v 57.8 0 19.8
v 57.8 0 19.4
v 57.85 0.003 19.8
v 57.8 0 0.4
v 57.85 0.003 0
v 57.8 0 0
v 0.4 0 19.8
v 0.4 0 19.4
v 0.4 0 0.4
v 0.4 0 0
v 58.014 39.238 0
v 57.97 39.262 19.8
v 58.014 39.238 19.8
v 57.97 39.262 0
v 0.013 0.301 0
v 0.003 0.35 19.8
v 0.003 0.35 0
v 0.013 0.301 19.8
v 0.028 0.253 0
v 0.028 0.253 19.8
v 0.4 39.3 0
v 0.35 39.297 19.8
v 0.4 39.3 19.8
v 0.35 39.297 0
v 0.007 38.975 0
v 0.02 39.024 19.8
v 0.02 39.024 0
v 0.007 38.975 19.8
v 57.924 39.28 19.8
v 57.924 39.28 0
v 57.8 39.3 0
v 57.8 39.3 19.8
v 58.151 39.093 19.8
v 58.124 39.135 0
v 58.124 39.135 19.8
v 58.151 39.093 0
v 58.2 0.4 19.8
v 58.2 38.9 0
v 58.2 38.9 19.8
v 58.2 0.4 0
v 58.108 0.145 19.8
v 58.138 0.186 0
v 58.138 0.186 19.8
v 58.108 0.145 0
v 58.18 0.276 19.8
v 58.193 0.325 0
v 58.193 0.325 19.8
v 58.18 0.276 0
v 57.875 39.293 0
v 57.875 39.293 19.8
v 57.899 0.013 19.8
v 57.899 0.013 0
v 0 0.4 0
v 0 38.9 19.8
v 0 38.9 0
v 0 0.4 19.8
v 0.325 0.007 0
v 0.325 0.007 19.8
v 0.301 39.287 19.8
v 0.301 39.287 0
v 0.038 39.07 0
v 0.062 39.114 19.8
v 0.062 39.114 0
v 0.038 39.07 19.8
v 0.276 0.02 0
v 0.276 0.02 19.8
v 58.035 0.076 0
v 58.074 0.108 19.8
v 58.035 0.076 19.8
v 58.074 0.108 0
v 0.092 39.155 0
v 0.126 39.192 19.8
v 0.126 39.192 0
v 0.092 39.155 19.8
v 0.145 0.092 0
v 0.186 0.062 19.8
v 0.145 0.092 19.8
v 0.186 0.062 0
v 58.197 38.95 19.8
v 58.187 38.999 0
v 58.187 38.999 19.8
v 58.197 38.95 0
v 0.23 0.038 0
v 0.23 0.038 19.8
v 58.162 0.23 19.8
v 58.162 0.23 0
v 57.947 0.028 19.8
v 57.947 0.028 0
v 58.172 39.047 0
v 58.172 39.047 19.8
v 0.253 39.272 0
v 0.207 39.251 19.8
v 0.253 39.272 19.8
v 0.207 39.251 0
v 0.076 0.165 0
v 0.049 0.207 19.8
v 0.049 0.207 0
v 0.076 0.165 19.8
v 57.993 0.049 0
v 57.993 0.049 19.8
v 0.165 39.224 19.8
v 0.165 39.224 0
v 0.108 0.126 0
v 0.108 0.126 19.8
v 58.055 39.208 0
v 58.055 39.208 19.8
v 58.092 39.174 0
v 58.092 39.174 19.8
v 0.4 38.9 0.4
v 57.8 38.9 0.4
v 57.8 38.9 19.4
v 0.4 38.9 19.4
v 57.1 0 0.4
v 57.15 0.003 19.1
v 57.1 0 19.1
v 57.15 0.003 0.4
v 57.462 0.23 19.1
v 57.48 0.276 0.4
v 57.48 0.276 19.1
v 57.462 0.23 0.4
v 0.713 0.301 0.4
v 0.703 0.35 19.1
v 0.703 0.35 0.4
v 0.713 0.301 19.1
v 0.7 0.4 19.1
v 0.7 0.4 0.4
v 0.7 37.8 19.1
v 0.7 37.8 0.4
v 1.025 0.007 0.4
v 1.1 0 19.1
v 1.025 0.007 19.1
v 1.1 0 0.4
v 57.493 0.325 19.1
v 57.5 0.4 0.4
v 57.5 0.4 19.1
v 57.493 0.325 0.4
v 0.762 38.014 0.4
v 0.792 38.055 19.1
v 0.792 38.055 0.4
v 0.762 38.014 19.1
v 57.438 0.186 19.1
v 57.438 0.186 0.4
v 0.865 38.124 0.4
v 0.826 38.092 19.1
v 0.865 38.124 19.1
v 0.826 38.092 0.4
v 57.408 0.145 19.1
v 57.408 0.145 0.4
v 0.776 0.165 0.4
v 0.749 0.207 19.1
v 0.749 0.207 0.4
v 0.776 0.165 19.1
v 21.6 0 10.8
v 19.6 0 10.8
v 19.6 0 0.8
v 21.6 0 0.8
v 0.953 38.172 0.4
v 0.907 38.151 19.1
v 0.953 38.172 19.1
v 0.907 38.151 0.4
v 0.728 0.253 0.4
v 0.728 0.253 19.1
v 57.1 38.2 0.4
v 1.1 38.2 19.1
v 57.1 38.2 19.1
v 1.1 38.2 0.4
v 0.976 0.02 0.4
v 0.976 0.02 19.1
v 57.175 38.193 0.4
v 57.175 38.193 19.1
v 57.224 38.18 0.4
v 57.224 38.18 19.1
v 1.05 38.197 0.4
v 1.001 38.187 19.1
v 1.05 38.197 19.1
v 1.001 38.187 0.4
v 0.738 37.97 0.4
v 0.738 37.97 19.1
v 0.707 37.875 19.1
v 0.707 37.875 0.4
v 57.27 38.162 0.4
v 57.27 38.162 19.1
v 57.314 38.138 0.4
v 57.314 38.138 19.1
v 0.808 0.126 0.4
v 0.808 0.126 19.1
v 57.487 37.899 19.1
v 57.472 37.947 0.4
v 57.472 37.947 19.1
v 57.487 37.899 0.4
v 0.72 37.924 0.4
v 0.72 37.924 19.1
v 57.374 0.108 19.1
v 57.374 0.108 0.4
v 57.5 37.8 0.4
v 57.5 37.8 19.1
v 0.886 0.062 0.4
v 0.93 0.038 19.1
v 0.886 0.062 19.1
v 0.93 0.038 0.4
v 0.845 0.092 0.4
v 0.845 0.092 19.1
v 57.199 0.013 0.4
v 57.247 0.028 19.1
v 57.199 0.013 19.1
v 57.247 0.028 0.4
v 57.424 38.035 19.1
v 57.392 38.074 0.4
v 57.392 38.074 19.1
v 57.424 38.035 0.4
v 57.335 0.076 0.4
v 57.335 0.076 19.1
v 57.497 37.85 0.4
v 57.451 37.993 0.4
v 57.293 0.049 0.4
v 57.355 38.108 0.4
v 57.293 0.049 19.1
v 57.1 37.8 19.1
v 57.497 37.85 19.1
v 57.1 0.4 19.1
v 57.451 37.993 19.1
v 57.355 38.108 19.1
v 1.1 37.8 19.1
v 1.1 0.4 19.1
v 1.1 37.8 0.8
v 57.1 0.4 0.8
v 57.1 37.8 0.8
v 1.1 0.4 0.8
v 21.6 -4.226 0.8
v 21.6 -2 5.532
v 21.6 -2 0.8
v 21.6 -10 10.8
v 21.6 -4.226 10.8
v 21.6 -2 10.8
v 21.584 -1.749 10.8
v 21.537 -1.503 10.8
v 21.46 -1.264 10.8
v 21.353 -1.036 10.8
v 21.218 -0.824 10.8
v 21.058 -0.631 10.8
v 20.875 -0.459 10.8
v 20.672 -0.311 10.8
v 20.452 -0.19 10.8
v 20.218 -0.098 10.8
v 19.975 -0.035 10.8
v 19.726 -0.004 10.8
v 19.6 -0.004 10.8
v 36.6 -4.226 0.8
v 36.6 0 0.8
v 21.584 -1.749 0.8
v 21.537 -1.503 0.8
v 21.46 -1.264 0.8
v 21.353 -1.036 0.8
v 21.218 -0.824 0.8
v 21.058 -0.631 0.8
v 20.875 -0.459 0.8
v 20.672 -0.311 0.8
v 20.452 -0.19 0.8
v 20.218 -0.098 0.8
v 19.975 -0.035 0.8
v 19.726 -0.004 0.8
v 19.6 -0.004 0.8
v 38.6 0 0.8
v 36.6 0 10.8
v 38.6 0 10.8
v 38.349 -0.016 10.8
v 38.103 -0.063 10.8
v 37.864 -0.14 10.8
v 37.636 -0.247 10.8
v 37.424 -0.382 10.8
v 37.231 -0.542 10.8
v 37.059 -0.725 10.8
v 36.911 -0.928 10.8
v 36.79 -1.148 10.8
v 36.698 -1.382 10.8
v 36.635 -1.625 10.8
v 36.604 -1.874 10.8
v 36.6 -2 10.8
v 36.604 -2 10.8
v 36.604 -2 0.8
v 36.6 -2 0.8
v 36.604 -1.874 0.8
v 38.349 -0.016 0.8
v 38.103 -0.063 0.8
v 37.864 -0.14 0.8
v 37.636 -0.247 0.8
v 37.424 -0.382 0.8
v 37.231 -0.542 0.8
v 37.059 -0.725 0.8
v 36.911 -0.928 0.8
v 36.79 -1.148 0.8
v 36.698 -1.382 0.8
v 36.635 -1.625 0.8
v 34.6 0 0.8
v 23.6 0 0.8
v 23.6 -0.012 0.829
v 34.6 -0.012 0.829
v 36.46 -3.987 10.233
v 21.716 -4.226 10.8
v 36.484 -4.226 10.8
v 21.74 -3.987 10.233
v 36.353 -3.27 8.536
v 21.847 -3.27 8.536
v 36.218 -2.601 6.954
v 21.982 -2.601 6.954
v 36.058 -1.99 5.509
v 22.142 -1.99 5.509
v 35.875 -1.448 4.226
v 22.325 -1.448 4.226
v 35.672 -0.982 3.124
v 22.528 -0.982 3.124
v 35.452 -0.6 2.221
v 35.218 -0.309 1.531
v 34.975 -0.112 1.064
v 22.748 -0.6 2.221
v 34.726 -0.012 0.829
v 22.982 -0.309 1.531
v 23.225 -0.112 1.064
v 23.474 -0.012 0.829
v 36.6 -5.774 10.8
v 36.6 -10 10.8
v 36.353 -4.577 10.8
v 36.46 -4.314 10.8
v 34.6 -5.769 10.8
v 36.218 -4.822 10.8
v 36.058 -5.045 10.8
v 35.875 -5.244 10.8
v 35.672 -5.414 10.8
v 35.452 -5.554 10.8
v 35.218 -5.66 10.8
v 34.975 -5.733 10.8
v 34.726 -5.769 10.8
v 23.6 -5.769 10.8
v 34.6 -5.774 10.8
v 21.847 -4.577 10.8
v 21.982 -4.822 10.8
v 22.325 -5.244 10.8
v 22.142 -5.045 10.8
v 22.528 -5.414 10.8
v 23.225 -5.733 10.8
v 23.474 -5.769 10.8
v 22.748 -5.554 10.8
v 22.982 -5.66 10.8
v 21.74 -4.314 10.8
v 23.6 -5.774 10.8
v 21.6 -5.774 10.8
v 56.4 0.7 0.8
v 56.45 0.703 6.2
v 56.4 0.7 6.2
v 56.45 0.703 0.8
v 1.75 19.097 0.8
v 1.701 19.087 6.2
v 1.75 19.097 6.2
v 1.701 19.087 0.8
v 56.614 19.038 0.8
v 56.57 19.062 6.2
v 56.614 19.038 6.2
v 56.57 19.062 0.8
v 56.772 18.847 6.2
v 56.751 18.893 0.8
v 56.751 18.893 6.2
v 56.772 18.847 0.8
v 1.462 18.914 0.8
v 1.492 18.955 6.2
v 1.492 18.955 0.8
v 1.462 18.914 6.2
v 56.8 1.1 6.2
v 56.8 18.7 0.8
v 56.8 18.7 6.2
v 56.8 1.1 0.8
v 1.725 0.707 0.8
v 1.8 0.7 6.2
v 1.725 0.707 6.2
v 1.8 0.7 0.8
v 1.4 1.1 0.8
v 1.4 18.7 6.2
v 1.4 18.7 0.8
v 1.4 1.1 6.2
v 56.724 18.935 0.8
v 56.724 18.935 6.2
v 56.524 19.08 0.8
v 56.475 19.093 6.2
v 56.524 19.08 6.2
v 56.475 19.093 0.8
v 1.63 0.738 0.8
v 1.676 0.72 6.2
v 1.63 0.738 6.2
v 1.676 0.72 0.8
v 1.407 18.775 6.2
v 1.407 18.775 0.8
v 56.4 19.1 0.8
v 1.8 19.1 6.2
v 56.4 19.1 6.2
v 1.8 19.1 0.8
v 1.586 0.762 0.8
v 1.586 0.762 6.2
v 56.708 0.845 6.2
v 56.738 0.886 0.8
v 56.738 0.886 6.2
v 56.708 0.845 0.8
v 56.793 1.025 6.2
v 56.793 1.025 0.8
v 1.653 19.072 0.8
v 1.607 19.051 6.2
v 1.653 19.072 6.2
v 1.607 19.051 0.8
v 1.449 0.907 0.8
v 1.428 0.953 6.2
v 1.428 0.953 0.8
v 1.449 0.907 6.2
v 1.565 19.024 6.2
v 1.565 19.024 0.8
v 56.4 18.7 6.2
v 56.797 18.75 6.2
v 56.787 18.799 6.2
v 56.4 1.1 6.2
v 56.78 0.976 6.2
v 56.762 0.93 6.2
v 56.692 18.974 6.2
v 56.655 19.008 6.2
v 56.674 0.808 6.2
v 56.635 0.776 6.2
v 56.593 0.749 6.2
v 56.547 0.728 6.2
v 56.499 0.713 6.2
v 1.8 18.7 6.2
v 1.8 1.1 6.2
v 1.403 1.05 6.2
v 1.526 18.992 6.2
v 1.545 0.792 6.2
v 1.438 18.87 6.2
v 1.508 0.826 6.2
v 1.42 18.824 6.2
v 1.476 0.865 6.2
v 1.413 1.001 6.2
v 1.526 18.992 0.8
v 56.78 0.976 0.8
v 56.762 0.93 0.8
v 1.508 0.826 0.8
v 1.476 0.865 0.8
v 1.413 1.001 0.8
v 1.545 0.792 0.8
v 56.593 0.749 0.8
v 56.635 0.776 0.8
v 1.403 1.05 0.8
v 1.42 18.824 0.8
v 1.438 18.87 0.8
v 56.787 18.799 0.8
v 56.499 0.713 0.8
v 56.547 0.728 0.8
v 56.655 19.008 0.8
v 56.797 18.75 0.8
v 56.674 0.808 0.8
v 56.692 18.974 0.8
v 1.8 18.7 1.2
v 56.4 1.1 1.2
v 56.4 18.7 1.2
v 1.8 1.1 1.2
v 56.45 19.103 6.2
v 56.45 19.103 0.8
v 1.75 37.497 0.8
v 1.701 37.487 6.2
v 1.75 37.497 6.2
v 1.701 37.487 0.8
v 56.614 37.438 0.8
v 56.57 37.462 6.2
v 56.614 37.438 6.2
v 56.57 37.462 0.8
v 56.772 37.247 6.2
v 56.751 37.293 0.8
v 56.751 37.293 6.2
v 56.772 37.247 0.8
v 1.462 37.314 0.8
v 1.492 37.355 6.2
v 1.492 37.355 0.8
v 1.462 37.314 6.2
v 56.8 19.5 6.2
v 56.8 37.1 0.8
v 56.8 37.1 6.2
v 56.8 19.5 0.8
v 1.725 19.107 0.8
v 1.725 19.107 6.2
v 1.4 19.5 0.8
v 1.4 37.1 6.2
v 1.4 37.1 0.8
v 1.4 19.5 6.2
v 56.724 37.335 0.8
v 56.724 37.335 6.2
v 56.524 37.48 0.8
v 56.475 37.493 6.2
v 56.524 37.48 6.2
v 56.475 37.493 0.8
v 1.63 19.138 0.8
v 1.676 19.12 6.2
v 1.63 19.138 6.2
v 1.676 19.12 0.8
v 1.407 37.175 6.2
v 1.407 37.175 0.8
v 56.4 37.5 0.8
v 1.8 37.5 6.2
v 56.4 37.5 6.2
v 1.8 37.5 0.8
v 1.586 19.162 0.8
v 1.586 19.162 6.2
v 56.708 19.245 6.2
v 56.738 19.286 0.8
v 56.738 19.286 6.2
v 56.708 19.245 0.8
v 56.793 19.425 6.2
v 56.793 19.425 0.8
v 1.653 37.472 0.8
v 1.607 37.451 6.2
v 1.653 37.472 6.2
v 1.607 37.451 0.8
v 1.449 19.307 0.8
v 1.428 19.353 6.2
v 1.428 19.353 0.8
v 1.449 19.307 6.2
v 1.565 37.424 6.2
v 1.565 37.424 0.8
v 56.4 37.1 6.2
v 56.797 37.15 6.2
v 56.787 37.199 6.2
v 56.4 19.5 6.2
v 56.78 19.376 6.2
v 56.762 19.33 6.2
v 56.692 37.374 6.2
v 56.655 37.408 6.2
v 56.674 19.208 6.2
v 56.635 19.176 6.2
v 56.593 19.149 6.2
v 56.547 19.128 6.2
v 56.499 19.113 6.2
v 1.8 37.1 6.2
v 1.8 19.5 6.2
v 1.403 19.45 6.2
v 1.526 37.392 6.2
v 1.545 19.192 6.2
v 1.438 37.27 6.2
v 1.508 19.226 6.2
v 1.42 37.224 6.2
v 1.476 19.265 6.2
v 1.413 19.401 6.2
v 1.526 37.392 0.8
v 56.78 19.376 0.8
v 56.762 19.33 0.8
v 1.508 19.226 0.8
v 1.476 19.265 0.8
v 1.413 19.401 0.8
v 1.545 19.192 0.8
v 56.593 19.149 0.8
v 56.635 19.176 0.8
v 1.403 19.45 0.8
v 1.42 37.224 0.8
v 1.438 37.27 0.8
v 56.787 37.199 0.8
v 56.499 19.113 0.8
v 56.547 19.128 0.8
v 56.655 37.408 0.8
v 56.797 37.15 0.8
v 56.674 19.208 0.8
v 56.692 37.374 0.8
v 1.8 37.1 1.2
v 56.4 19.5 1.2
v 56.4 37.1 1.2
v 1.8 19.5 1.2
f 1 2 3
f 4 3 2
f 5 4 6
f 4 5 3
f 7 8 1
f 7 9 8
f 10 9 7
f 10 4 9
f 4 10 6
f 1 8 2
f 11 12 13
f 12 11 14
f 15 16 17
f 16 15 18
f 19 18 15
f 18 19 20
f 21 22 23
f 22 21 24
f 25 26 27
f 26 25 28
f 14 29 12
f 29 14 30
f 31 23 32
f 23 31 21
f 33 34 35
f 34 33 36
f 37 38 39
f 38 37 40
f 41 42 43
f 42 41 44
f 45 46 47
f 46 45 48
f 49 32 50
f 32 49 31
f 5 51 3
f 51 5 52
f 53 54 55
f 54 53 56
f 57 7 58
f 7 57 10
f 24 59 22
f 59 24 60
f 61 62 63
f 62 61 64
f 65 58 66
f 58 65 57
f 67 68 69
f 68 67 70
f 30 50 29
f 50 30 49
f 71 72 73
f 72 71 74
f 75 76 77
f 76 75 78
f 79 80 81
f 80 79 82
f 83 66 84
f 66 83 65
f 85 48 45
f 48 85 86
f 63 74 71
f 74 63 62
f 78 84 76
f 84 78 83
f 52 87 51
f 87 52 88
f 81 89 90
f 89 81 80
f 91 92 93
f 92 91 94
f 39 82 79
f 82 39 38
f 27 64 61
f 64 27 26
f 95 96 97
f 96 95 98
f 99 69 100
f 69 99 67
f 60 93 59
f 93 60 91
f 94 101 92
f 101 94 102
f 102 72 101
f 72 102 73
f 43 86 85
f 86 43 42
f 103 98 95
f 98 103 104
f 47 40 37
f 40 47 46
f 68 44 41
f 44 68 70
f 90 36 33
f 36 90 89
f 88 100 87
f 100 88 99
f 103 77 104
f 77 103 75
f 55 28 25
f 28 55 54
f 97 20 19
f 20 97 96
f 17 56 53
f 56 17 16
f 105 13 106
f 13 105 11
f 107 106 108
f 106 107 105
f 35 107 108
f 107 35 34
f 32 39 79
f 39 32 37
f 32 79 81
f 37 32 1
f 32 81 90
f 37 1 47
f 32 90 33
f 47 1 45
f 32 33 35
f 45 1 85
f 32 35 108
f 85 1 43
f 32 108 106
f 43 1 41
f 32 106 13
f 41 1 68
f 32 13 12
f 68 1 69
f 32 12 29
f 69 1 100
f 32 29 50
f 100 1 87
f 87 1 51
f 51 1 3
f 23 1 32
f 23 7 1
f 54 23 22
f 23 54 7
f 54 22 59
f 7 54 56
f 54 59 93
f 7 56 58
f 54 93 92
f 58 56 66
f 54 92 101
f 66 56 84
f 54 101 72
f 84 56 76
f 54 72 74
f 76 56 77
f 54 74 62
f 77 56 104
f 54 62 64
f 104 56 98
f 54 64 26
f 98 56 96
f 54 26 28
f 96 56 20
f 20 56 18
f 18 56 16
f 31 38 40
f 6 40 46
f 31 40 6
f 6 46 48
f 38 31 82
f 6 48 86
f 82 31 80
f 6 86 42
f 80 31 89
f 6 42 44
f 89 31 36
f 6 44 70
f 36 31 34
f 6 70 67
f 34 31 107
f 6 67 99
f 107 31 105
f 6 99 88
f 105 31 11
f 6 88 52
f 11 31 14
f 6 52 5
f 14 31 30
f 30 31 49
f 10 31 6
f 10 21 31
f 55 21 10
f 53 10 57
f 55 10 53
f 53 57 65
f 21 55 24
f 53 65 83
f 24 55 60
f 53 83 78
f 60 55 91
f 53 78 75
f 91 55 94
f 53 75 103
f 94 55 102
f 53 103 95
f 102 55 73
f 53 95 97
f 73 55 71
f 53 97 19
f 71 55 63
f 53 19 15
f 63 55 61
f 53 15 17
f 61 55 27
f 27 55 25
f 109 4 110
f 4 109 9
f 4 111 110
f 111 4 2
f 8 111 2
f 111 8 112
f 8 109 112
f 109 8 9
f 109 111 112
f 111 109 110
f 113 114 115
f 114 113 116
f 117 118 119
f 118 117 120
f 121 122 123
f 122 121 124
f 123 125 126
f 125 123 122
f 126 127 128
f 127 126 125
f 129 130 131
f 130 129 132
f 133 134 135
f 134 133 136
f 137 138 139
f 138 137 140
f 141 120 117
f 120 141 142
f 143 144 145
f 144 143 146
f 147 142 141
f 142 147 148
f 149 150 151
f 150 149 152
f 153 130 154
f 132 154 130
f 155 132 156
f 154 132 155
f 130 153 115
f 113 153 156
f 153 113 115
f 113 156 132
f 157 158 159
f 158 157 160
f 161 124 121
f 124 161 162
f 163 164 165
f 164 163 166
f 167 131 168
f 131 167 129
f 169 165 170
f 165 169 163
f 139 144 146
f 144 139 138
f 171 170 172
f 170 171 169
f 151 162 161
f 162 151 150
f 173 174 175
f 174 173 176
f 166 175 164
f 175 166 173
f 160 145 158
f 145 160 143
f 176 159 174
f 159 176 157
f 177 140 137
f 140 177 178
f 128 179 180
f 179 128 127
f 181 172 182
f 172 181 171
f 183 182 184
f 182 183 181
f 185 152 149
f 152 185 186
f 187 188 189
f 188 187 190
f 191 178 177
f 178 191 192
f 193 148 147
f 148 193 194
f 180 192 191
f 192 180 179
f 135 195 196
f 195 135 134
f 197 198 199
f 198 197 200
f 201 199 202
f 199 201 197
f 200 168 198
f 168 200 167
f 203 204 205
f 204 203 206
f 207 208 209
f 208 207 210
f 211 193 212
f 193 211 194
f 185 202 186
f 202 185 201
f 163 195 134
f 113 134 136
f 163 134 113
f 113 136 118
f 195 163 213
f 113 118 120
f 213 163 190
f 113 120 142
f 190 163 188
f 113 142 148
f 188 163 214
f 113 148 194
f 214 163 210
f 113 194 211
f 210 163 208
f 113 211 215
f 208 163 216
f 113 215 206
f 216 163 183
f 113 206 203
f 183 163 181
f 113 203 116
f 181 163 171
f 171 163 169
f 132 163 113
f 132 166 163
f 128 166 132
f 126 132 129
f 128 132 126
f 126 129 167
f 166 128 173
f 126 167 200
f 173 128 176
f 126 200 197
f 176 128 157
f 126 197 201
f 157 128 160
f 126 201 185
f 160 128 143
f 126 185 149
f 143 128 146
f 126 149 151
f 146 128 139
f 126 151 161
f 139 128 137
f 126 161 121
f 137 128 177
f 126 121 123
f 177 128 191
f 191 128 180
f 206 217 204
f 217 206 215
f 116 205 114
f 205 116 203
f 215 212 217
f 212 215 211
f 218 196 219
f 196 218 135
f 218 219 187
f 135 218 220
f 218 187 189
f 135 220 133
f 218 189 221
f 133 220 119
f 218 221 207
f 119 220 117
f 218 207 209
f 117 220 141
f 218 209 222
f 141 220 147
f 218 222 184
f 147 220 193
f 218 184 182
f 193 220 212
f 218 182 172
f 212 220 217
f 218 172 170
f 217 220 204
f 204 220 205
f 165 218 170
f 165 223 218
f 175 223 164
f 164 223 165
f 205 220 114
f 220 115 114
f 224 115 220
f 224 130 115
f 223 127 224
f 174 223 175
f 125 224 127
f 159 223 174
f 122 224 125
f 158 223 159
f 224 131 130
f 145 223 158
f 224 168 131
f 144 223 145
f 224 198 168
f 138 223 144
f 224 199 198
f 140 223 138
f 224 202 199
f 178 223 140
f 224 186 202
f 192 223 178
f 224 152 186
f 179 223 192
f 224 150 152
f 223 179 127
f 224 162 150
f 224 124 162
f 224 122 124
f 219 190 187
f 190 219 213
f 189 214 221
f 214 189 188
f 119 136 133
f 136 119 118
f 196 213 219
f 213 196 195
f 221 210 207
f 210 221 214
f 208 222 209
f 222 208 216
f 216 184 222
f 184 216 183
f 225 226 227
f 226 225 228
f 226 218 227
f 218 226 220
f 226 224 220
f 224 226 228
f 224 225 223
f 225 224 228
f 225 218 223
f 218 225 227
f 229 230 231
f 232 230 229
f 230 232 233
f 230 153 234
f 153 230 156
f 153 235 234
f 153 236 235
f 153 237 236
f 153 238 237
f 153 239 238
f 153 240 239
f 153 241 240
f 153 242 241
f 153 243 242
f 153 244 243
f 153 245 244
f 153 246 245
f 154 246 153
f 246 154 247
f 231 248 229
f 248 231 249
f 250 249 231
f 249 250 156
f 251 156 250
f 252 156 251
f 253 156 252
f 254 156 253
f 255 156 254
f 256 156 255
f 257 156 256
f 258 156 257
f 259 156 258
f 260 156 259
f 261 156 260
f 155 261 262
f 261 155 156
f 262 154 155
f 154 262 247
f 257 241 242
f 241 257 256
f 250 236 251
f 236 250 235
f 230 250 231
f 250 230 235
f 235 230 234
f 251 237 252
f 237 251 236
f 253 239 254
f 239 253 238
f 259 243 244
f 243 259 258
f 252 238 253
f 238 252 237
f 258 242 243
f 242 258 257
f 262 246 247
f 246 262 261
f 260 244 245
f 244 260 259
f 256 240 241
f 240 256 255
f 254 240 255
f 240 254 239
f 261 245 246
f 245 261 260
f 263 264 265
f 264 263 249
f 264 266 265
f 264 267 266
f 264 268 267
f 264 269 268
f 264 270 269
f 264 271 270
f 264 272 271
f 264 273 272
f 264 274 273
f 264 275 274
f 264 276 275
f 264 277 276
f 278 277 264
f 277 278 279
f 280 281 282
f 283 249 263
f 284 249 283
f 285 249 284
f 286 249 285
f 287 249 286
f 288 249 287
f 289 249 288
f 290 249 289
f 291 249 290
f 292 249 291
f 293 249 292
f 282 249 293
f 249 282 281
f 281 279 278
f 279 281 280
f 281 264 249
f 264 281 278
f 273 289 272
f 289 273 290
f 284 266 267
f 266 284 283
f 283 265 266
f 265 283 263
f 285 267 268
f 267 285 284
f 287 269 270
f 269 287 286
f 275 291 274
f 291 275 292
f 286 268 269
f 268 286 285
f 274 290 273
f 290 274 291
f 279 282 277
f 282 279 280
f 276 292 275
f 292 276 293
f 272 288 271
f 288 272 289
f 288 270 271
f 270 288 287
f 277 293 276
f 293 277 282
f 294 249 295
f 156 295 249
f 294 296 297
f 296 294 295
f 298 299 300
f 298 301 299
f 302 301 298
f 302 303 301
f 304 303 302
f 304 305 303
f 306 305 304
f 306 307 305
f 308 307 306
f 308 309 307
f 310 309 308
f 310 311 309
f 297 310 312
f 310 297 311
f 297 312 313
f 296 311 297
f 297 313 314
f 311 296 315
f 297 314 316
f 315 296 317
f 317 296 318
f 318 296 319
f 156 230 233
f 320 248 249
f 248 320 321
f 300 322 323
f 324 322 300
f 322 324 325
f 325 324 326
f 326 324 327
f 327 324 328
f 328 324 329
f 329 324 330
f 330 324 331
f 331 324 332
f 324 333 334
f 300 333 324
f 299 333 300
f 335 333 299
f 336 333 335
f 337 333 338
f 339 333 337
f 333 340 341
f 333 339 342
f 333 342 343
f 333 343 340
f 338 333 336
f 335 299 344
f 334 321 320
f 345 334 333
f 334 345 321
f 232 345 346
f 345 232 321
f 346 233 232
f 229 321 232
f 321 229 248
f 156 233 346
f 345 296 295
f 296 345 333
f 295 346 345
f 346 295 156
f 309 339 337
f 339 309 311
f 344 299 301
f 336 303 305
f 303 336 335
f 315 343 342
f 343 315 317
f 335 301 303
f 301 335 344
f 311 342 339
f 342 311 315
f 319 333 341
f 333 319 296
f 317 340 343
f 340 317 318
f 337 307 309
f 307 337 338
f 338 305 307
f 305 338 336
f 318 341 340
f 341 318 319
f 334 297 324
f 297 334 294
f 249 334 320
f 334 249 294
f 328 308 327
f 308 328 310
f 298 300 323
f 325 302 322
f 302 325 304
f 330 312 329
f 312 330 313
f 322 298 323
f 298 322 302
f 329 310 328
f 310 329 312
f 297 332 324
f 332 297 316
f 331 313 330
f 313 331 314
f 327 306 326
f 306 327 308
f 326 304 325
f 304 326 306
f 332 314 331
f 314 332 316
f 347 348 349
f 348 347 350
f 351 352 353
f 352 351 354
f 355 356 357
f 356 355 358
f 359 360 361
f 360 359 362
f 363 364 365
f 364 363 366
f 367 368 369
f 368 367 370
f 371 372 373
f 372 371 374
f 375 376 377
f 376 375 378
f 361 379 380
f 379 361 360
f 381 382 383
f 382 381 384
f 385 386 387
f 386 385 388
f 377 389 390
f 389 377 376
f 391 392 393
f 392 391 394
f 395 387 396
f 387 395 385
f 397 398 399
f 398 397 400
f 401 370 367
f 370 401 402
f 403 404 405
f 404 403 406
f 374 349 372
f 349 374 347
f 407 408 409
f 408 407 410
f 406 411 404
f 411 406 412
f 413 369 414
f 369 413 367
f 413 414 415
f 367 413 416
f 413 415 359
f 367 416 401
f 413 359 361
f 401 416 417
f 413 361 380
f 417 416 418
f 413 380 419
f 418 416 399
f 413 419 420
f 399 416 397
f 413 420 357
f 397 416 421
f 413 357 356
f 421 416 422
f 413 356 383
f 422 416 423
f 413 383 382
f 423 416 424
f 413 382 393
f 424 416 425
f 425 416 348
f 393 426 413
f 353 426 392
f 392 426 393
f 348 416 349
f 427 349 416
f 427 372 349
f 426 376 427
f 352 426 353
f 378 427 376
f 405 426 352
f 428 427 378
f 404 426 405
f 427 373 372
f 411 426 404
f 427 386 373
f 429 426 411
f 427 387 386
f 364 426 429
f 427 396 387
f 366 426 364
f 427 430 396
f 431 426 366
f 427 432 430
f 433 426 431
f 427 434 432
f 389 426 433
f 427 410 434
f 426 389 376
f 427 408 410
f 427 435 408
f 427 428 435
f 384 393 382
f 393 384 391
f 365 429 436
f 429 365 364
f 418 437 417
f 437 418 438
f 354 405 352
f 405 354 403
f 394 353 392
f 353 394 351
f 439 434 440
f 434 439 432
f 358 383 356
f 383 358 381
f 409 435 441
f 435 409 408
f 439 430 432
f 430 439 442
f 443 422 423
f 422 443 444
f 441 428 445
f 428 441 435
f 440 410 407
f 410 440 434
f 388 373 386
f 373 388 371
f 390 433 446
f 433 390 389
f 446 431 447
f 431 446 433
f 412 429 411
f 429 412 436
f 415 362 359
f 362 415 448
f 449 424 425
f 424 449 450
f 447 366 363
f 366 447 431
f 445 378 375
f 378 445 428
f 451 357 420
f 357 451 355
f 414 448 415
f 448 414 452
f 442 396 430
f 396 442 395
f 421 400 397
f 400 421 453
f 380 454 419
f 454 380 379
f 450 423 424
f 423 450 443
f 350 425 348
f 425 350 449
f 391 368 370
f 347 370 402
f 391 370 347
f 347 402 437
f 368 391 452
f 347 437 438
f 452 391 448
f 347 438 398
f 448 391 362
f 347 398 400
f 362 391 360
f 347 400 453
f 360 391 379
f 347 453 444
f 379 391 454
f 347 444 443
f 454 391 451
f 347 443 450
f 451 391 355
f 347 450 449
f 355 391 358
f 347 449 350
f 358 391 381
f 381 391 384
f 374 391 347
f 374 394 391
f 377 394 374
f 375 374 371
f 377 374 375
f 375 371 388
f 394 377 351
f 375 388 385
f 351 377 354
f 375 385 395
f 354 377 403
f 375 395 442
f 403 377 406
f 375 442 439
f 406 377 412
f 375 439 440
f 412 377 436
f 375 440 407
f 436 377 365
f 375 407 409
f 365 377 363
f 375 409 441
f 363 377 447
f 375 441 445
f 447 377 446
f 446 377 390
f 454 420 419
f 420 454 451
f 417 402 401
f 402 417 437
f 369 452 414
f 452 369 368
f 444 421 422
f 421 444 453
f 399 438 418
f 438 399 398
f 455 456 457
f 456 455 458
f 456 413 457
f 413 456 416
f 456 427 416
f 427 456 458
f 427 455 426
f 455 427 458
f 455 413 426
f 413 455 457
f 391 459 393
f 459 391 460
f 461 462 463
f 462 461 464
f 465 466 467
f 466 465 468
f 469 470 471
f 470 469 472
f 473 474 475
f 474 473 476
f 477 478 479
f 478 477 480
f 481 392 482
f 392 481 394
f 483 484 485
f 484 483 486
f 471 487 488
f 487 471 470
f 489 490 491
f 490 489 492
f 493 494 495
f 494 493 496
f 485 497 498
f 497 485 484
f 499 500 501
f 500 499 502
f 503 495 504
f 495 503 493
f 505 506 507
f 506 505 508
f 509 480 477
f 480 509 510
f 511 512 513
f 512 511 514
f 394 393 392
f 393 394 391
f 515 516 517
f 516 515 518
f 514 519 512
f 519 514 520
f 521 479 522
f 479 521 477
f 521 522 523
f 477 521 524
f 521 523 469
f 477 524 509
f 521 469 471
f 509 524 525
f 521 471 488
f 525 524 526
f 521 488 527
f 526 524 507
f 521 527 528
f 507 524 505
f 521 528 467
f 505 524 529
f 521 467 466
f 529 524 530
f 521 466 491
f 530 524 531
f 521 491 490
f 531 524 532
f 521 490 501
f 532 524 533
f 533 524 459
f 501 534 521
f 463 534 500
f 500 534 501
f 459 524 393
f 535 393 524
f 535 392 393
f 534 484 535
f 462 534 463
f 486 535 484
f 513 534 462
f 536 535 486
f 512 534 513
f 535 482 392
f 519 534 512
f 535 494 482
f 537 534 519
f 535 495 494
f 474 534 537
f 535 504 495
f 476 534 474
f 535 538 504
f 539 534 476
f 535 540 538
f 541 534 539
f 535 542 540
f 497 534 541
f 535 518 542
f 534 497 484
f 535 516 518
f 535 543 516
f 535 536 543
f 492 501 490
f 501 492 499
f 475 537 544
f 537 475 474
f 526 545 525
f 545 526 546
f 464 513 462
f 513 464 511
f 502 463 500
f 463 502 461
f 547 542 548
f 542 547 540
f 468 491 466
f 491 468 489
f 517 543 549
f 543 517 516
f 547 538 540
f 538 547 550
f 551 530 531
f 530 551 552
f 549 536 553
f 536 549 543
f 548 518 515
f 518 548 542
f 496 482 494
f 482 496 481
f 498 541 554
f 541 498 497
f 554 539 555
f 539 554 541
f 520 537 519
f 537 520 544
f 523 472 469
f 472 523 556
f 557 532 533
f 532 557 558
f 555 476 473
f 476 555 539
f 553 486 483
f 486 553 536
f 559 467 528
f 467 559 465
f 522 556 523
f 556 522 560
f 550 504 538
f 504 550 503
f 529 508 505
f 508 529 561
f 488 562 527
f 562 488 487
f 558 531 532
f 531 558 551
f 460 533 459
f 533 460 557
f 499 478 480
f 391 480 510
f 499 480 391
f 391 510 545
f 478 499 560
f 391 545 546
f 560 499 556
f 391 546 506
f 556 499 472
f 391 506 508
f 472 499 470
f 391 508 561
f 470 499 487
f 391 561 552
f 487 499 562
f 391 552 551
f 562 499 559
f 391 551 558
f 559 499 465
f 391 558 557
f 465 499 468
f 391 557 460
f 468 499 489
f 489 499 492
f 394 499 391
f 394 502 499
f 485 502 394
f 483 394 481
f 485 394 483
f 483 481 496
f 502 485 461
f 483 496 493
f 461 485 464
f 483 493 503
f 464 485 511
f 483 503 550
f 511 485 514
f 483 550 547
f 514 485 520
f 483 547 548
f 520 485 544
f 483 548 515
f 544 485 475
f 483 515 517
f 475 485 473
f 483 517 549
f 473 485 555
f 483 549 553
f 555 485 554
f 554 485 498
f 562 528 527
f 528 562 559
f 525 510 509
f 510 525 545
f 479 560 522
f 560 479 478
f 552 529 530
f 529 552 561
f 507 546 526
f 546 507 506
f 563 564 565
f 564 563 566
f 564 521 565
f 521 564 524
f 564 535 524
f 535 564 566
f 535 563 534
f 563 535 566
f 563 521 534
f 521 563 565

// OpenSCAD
/* [Key Profile] */

fancy_render = true;
$fn = fancy_render ? 50 : 10;

// Select the key spacing standard used to size each tray footprint.
key_profile = "choc"; // [mx, choc]

/* [3D Printing] */

// 3D printing settings and validation.
spiral_vase = true; // [true, false]
nozzle_width_mm = 0.4; // [0.2:0.05:1.0]

/* [Key Spacing] */

// Standard key spacing dimensions.
mx_key_spacing_mm = 19.05; // [18:0.05:20]
choc_key_spacing_x_mm = 18; // [16:0.05:20]
choc_key_spacing_y_mm = 17; // [16:0.05:20]

// Shared wall, floor, and fit dimensions.
wall_thickness_mm = 0.4; // [0.2:0.05:2.0]
floor_thickness_mm = 0.4; // [0.2:0.05:2.0]
default_clearance_mm = 0.3; // [0:0.05:1.0]

// Effective print dimensions. Spiral vase mode forces single-line walls and floor.
effective_wall_thickness_mm = spiral_vase ? nozzle_width_mm : wall_thickness_mm;
effective_floor_thickness_mm = spiral_vase ? nozzle_width_mm : floor_thickness_mm;

assert(nozzle_width_mm > 0, "nozzle_width_mm must be greater than 0");
assert(wall_thickness_mm > 0, "wall_thickness_mm must be greater than 0");
assert(floor_thickness_mm > 0, "floor_thickness_mm must be greater than 0");
assert(default_clearance_mm >= 0, "default_clearance_mm must be non-negative");
assert(
  !spiral_vase || wall_thickness_mm == nozzle_width_mm,
  "spiral_vase requires wall_thickness_mm to match nozzle_width_mm"
);
assert(
  !spiral_vase || floor_thickness_mm == nozzle_width_mm,
  "spiral_vase requires floor_thickness_mm to match nozzle_width_mm"
);

/* [Tray Geometry] */

// Tray-specific sizing controls.
max_keycap_height_mm = 17; // [8:0.5:30]
tray_lip_height_mm = 5; // [1:0.5:20]
tray_length_u = 1; // [1:1:8]
handle_depth_mm = 10; // [0:0.5:20]
handle_width_mm = 15; // [0:0.5:20]
// Tiny vertical corner rounding to smooth toolpaths without materially changing fit.
vertical_corner_radius_mm = 0.4; // [0:0.05:1.0]

/* [Container Layout] */

// Container layout sizing: trays span the full row width, with one tray per row.
tray_count_x = 3; // [1:1:12]
tray_count_y = 2; // [1:1:12]
tray_container_clearance_mm = 0.3; // [0:0.05:1.0]

/* [Drawer] */

// Drawer fit sizing around the tray container.
drawer_clearance_mm = 0.3; // [0:0.05:1.0]

/* [Debug] */

// Spread the drawer, container, and trays apart for inspection.
debug_exploded_view = false; // [true, false]
debug_explode_distance_mm = 20; // [0:1:100]

/* [Hidden] */

// Resolve the active spacing from the selected key profile.
key_spacing_x_mm = key_profile == "mx" ? mx_key_spacing_mm : choc_key_spacing_x_mm;
key_spacing_y_mm = key_profile == "mx" ? mx_key_spacing_mm : choc_key_spacing_y_mm;

// A tray is fixed to 1u in y, while row width in x and lip height in z remain parametric.
row_tray_width_u = tray_count_x;
tray_height_mm = tray_lip_height_mm;
stack_height_mm = max_keycap_height_mm + default_clearance_mm * 2;
handle_angle_deg = 60;

// Inner tray envelope sized around one row-wide tray footprint plus fit clearance.
tray_inner_x_mm = key_spacing_x_mm * row_tray_width_u + default_clearance_mm * 2;
tray_inner_y_mm = key_spacing_y_mm * tray_length_u + default_clearance_mm * 2;
tray_inner_z_mm = tray_height_mm;

// Outer tray shell dimensions.
tray_outer_x_mm = tray_inner_x_mm + effective_wall_thickness_mm * 2;
tray_outer_y_mm = tray_inner_y_mm + effective_wall_thickness_mm * 2;
tray_outer_z_mm = tray_inner_z_mm + effective_floor_thickness_mm;
tray_outer_corner_radius_mm = min(vertical_corner_radius_mm, min(tray_outer_x_mm, tray_outer_y_mm) / 2);
tray_inner_corner_radius_mm = max(0, tray_outer_corner_radius_mm - effective_wall_thickness_mm);

// Container inner cavity sized to receive one tray per row and the full key stack height.
tray_container_inner_x_mm = tray_outer_x_mm + tray_container_clearance_mm * 2;
tray_container_inner_y_mm = tray_outer_y_mm * tray_count_y + tray_container_clearance_mm * 2;
tray_container_inner_z_mm = stack_height_mm + effective_floor_thickness_mm + tray_container_clearance_mm;

// Outer container shell dimensions.
tray_container_outer_x_mm = tray_container_inner_x_mm + effective_wall_thickness_mm * 2;
tray_container_outer_y_mm = tray_container_inner_y_mm + effective_wall_thickness_mm * 2;
tray_container_outer_z_mm = tray_container_inner_z_mm + effective_floor_thickness_mm;
tray_container_outer_corner_radius_mm = min(vertical_corner_radius_mm, min(tray_container_outer_x_mm, tray_container_outer_y_mm) / 2);
tray_container_inner_corner_radius_mm = max(0, tray_container_outer_corner_radius_mm - effective_wall_thickness_mm);
handle_rise_mm = min(10, tray_container_outer_z_mm);
handle_run_mm = handle_rise_mm / tan(handle_angle_deg);
handle_projection_mm = max(handle_depth_mm, handle_run_mm);
handle_face_offset_mm = max(0, handle_projection_mm - handle_run_mm);
handle_corner_radius_mm = min(2, handle_rise_mm / 2, handle_projection_mm / 2);
handle_fillet_adjacent_mm = handle_corner_radius_mm / tan(handle_angle_deg);
handle_hypotenuse_mm = handle_rise_mm / sin(handle_angle_deg);

// Drawer inner cavity sized to receive the tray container from the front.
drawer_inner_x_mm = tray_container_outer_x_mm + drawer_clearance_mm * 2;
drawer_inner_y_mm = tray_container_outer_y_mm + drawer_clearance_mm + effective_wall_thickness_mm;
drawer_inner_z_mm = tray_container_outer_z_mm + drawer_clearance_mm;

// Outer drawer shell dimensions.
drawer_outer_x_mm = drawer_inner_x_mm + effective_wall_thickness_mm * 2;
drawer_outer_y_mm = drawer_inner_y_mm + effective_wall_thickness_mm;
drawer_outer_z_mm = drawer_inner_z_mm + effective_floor_thickness_mm + effective_wall_thickness_mm;
drawer_outer_corner_radius_mm = min(vertical_corner_radius_mm, min(drawer_outer_x_mm, drawer_outer_y_mm) / 2);
drawer_inner_corner_radius_mm = max(0, drawer_outer_corner_radius_mm - effective_wall_thickness_mm);

// Build a rounded rectangular prism with tiny fillets on the vertical corners.
module rounded_rect_prism(size, radius) {
  linear_extrude(height=size[2])
    offset(r=radius)
      translate([radius, radius])
        square(
          [
            max(0.01, size[0] - radius * 2),
            max(0.01, size[1] - radius * 2),
          ]
        );
}

module tray_container_handle_body() {
  translate(
    [
      (tray_container_outer_x_mm - handle_width_mm) / 2,
      0,
      effective_floor_thickness_mm + handle_rise_mm,
    ]
  )
    rotate([90, 180, 90])
      linear_extrude(height=handle_width_mm)
        polygon(
          points=[
            [handle_face_offset_mm, 0],
            [handle_projection_mm, 0],
            [handle_projection_mm - handle_run_mm, handle_rise_mm],
            [0, handle_rise_mm],
          ]
        );
}

module tray_container_handle_side_fillet_cutter(side) {
  if (side < 0) {
    difference() {
      translate(
        [
          (tray_container_outer_x_mm - handle_width_mm) / 2 - handle_corner_radius_mm,
          -handle_corner_radius_mm,
          effective_floor_thickness_mm,
        ]
      )
        cube(
          [
            handle_corner_radius_mm,
            handle_corner_radius_mm,
            handle_rise_mm,
          ]
        );
      translate(
        [
          (tray_container_outer_x_mm - handle_width_mm) / 2 - handle_corner_radius_mm,
          -handle_corner_radius_mm,
          effective_floor_thickness_mm,
        ]
      )
        cylinder(h=handle_rise_mm, r=handle_corner_radius_mm);
    }
  } else {
    translate(
      [
        (tray_container_outer_x_mm + handle_width_mm) / 2 + handle_corner_radius_mm,
        -handle_corner_radius_mm,
        effective_floor_thickness_mm,
      ]
    )
      rotate([0, 0, 90])
        translate(
          [
            -(tray_container_outer_x_mm + handle_width_mm) / 2,
            handle_corner_radius_mm,
            -effective_floor_thickness_mm,
          ]
        )
          difference() {
            translate(
              [
                (tray_container_outer_x_mm + handle_width_mm) / 2,
                -handle_corner_radius_mm,
                effective_floor_thickness_mm,
              ]
            )
              cube(
                [
                  handle_corner_radius_mm,
                  handle_corner_radius_mm,
                  handle_rise_mm,
                ]
              );
            translate(
              [
                (tray_container_outer_x_mm + handle_width_mm) / 2,
                -handle_corner_radius_mm,
                effective_floor_thickness_mm,
              ]
            )
              cylinder(h=handle_rise_mm, r=handle_corner_radius_mm);
          }
  }
}

module tray_container_handle_hypotenuse_fillet_cutter(side) {
  angle = 90 - handle_angle_deg;
  if (side < 0) {
    translate(
      [
        (tray_container_outer_x_mm - handle_width_mm) / 2 - handle_corner_radius_mm,
        -handle_corner_radius_mm * 2 * tan(angle),
        effective_floor_thickness_mm,
      ]
    )
      rotate([-angle, 0, 180])
        translate(
          [
            -( (tray_container_outer_x_mm - handle_width_mm) / 2 + handle_corner_radius_mm),
            -handle_corner_radius_mm,
            -effective_floor_thickness_mm - (handle_corner_radius_mm * tan(angle)),
          ]
        )
          difference() {
            translate(
              [
                (tray_container_outer_x_mm - handle_width_mm) / 2 - handle_corner_radius_mm,
                -handle_corner_radius_mm,
                effective_floor_thickness_mm,
              ]
            )
              cube(
                [
                  handle_corner_radius_mm,
                  handle_corner_radius_mm,
                  handle_hypotenuse_mm,
                ]
              );
            translate(
              [
                (tray_container_outer_x_mm - handle_width_mm) / 2 - handle_corner_radius_mm,
                -handle_corner_radius_mm,
                effective_floor_thickness_mm,
              ]
            )
              cylinder(h=handle_hypotenuse_mm, r=handle_corner_radius_mm);
          }
  } else {
    translate([tray_container_outer_x_mm, 0, 0])
      mirror([1, 0, 0])
        tray_container_handle_hypotenuse_fillet_cutter(-1);
  }
}

// Build the front tray-container handle as an angled prism rising from the base.
module tray_container_handle() {
  difference() {
    union() {
      tray_container_handle_body();
      tray_container_handle_side_fillet_cutter(-1);
      tray_container_handle_side_fillet_cutter(1);
    }
    ;
    tray_container_handle_hypotenuse_fillet_cutter(-1);
    tray_container_handle_hypotenuse_fillet_cutter(1);
  }
}

// Build a single open-top tray.
module key_tray() {
  difference() {
    rounded_rect_prism(
      [tray_outer_x_mm, tray_outer_y_mm, tray_outer_z_mm],
      tray_outer_corner_radius_mm
    );
    translate([effective_wall_thickness_mm, effective_wall_thickness_mm, effective_floor_thickness_mm])
      rounded_rect_prism(
        [tray_inner_x_mm, tray_inner_y_mm, tray_inner_z_mm],
        tray_inner_corner_radius_mm
      );
  }
}

// Build the open-top container shell that holds one or more trays.
module tray_container() {
  union() {
    difference() {
      rounded_rect_prism(
        [tray_container_outer_x_mm, tray_container_outer_y_mm, tray_container_outer_z_mm],
        tray_container_outer_corner_radius_mm
      );
      translate([effective_wall_thickness_mm, effective_wall_thickness_mm, effective_floor_thickness_mm])
        rounded_rect_prism(
          [tray_container_inner_x_mm, tray_container_inner_y_mm, tray_container_inner_z_mm],
          tray_container_inner_corner_radius_mm
        );
    }
    tray_container_handle();
  }
}

// Build the outer drawer shell with a front opening for the tray container.
module outer_drawer() {
  difference() {
    rounded_rect_prism(
      [drawer_outer_x_mm, drawer_outer_y_mm, drawer_outer_z_mm],
      drawer_outer_corner_radius_mm
    );
    translate([effective_wall_thickness_mm, 0, effective_floor_thickness_mm])
      rounded_rect_prism(
        [drawer_inner_x_mm, drawer_inner_y_mm, drawer_inner_z_mm],
        drawer_inner_corner_radius_mm
      );
  }
}

// Place one tray in each row so the tray width follows the container width.
module tray_container_layout() {
  for (iy = [0:tray_count_y - 1]) {
    translate(
      [
        effective_wall_thickness_mm + tray_container_clearance_mm,
        effective_wall_thickness_mm + tray_container_clearance_mm + iy * tray_outer_y_mm,
        effective_floor_thickness_mm,
      ]
    )
      key_tray();
  }
}

// Preview the fitted relationship between the tray container and its trays.
module tray_container_assembly() {
  tray_container();
  tray_container_layout();
}

// Preview the drawer, container, and trays separated for easier inspection.
module exploded_drawer_assembly() {
  outer_drawer();
  translate(
    [
      drawer_outer_x_mm + debug_explode_distance_mm,
      0,
      0,
    ]
  )
    tray_container();
  translate(
    [
      drawer_outer_x_mm + tray_container_outer_x_mm + debug_explode_distance_mm * 2,
      0,
      0,
    ]
  )
    tray_container_layout();
}

// Preview the fitted relationship between the drawer, container, and trays.
module drawer_assembly() {
  outer_drawer();
  translate(
    [
      effective_wall_thickness_mm + drawer_clearance_mm,
      0,
      effective_floor_thickness_mm,
    ]
  )
    tray_container_assembly();
}

if (debug_exploded_view) {
  exploded_drawer_assembly();
} else {
  drawer_assembly();
}
